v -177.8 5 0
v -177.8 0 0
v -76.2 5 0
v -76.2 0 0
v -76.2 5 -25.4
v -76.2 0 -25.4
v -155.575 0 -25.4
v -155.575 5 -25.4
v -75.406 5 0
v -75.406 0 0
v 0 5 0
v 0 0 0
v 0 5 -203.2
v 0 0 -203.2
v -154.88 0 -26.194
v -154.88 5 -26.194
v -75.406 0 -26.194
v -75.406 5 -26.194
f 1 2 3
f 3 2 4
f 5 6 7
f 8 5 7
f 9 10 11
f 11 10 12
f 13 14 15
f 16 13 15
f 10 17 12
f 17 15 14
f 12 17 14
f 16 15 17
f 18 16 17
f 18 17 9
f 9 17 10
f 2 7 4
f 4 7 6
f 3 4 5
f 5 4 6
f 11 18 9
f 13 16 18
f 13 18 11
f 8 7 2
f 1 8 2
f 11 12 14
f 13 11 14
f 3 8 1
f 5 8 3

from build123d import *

# Parameters (mm, degrees)
BOSS_EXTRUDE1_DEPTH     = 5
CUT_EXTRUDE_THIN1_DEPTH = 6


with BuildPart() as part:
    # Sketch1 → Boss-Extrude1 (new body)
    with BuildSketch(Plane(origin=(0, 0, 0), x_dir=(1, 0, 0), z_dir=(0, 1, 0))):
        Polygon((0, 0), (0, 203.2), (-177.8, 0), align=None)
    extrude(amount=BOSS_EXTRUDE1_DEPTH)

    # Sketch1<3> → Cut-Extrude-Thin1 (cut)
    with BuildSketch(Plane(origin=(0, 0, 0), x_dir=(1, 0, 0), z_dir=(0, 1, 0))):
        Polygon((-76.2, 0), (-76.2, 25.4), (-155.575, 25.4), (-155.575, 26.19375), (-75.40625, 26.19375), (-75.40625, 0), align=None)
    extrude(amount=CUT_EXTRUDE_THIN1_DEPTH, mode=Mode.SUBTRACT)


with BuildPart() as cut_extrude_thin1_piece_1:
    # of the separate pieces the step leaves, piece 1, a body of its own (cut_extrude_thin1_pieces)
    add(part.part.solids().sort_by_distance((0, 0, 0))[0])


with BuildPart() as cut_extrude_thin1_piece_2:
    # of the separate pieces the step leaves, piece 2, a body of its own (cut_extrude_thin1_pieces)
    add(part.part.solids().sort_by_distance((-177.8, 0, 0))[0])


solid = Compound([cut_extrude_thin1_piece_1.part, cut_extrude_thin1_piece_2.part])
